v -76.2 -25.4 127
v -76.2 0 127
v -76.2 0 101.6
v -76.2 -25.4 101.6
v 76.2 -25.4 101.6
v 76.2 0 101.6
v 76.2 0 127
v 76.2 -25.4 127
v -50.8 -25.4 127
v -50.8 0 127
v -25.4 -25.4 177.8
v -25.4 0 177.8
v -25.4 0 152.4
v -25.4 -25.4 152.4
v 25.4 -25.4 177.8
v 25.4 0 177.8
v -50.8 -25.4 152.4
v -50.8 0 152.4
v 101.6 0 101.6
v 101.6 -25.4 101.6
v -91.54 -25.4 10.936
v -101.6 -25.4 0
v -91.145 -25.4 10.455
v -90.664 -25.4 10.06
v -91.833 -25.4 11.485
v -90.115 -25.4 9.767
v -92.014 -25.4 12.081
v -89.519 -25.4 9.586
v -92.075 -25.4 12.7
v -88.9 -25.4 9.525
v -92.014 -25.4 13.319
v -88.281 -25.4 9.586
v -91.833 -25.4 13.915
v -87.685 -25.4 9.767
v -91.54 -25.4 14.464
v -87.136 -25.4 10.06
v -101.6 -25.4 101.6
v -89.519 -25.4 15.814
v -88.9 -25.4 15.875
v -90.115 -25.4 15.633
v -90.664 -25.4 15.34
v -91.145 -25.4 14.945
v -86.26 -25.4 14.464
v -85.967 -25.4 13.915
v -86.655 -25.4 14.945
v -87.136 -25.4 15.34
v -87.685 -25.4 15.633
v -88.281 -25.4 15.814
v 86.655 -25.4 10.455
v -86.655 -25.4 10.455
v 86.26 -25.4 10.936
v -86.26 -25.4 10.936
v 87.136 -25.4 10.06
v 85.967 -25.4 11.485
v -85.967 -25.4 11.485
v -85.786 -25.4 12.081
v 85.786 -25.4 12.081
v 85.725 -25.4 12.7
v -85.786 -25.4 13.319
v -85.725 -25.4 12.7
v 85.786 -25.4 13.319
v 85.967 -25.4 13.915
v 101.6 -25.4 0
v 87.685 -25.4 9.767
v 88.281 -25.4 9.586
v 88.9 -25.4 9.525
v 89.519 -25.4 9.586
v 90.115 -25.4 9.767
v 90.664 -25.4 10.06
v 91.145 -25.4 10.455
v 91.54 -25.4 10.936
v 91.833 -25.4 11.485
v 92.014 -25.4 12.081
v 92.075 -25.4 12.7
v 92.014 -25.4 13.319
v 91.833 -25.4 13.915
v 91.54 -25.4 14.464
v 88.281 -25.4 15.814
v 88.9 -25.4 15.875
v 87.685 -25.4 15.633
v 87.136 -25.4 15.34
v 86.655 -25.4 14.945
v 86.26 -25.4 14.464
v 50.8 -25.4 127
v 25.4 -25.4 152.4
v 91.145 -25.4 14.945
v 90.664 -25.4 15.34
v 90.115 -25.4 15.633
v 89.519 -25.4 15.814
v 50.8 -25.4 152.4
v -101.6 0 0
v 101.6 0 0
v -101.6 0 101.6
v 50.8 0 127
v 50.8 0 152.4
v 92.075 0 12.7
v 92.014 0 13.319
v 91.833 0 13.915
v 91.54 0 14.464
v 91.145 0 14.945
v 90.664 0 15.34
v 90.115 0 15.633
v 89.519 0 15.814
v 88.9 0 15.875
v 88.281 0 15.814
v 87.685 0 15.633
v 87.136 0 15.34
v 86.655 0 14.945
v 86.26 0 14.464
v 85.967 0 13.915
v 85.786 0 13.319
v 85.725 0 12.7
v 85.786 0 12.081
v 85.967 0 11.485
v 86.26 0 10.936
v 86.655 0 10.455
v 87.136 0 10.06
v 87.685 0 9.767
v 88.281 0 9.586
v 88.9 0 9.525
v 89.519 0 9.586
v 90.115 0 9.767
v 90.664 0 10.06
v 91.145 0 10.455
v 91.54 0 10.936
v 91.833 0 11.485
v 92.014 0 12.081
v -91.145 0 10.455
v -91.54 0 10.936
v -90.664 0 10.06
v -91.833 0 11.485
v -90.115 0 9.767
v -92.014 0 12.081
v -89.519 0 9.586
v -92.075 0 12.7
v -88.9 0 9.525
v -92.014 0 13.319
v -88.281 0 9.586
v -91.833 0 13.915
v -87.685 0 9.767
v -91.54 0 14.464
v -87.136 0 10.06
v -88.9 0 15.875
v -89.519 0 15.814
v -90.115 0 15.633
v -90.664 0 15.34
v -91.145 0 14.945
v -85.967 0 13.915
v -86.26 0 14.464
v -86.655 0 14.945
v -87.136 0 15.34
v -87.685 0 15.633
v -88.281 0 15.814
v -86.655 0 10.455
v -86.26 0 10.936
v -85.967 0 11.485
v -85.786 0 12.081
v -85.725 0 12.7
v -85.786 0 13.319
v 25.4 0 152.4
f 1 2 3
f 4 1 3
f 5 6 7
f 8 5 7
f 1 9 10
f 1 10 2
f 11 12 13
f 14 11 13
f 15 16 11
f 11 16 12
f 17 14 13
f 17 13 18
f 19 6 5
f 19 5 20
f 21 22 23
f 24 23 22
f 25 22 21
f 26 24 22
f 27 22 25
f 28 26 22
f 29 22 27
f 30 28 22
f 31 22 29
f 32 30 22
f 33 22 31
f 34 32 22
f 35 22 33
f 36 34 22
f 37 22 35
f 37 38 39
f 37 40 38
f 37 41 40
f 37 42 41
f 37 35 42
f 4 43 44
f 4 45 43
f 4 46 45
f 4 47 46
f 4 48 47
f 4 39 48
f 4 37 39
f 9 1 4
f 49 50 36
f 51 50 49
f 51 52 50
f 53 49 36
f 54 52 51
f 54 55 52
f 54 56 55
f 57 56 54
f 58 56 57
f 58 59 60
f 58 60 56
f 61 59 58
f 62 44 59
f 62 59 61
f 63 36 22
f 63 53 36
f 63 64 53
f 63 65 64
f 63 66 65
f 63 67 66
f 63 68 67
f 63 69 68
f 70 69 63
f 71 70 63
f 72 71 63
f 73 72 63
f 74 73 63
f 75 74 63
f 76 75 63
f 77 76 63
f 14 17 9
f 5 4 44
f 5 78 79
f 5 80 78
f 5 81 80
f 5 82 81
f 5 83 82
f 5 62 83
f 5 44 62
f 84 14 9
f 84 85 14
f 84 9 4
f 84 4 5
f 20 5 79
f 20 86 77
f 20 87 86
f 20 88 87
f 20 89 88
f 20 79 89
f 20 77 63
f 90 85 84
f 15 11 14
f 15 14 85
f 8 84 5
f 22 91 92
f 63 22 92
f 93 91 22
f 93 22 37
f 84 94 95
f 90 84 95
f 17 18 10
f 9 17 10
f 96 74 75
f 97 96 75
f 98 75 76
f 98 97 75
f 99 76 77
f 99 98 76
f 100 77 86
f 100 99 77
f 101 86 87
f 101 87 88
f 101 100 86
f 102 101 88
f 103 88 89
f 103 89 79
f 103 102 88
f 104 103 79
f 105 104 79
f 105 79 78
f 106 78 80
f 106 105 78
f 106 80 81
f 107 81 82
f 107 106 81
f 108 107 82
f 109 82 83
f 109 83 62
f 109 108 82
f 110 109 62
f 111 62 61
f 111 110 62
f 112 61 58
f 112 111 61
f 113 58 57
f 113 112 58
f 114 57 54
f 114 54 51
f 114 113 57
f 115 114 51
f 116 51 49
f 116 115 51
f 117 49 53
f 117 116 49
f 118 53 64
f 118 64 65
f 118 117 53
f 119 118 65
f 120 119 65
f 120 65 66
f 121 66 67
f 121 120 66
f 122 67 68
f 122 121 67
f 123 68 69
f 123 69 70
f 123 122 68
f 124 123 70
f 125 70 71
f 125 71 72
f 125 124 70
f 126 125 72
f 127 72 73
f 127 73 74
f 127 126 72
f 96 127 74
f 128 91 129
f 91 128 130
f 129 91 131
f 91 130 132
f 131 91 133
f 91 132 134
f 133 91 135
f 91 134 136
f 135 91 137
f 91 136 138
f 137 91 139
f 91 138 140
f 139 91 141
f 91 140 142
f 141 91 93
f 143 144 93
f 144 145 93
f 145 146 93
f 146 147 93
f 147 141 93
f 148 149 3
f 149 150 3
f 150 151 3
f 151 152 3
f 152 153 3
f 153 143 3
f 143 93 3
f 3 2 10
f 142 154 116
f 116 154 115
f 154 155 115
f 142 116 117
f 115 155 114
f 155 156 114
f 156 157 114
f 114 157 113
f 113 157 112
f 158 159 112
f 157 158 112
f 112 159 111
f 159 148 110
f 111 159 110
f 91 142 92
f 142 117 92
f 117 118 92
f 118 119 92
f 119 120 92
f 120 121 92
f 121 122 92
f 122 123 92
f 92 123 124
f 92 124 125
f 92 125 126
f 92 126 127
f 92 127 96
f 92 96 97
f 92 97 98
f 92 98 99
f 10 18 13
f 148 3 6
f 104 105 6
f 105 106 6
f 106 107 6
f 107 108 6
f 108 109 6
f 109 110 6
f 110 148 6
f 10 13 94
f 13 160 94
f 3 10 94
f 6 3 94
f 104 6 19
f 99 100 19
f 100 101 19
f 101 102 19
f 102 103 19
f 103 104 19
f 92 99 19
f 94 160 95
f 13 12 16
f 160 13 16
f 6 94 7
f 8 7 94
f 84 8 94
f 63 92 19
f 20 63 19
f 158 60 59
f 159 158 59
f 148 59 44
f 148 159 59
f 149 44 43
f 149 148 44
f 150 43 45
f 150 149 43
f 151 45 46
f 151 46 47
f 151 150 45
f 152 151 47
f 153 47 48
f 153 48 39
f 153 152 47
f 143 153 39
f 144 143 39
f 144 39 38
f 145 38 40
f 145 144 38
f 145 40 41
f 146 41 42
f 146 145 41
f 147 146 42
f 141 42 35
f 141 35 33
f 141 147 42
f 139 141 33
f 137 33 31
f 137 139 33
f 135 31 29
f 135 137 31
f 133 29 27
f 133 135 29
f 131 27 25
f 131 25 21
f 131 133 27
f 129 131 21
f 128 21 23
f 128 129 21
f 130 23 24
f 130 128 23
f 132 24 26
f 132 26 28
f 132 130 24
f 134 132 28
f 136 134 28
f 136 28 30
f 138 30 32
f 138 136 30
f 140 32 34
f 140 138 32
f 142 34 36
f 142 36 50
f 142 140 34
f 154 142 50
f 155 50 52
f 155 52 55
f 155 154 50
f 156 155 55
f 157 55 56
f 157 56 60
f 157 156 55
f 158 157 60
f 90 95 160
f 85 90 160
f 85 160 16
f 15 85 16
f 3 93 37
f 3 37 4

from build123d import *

# Parameters (mm, degrees)
F0_W     = 25.4
F0_H     = 101.6
F0_R     = 3.175
F1_DEPTH = 25.4


with BuildPart() as f1:
    # F0 (on Front) → F1 (new body)
    with BuildSketch(Plane.XZ):
        with Locations((-88.9, 50.8)):
            Rectangle(F0_W, F0_H)
        with Locations((-88.9, 12.7)):
            Circle(F0_R, mode=Mode.SUBTRACT)
        Polygon((-76.2, 0), (-50.8, 0), (-50.8, 127), (-76.2, 127), (-76.2, 101.6), align=None)
        Polygon((-50.8, 0), (-25.4, 0), (-25.4, 152.4), (-50.8, 152.4), (-50.8, 127), align=None)
        Polygon((-25.4, 0), (0, 0), (0, 177.8), (-25.4, 177.8), (-25.4, 152.4), align=None)
        Polygon((0, 177.8), (0, 0), (25.4, 0), (25.4, 152.4), (25.4, 177.8), align=None)
        Polygon((25.4, 152.4), (25.4, 0), (50.8, 0), (50.8, 127), (50.8, 152.4), align=None)
        Polygon((50.8, 127), (50.8, 0), (76.2, 0), (76.2, 101.6), (76.2, 127), align=None)
        with Locations((88.9, 50.8)):
            Rectangle(F0_W, F0_H)
        with Locations((88.9, 12.7)):
            Circle(F0_R, mode=Mode.SUBTRACT)
    extrude(amount=F1_DEPTH)


solid = f1.part
